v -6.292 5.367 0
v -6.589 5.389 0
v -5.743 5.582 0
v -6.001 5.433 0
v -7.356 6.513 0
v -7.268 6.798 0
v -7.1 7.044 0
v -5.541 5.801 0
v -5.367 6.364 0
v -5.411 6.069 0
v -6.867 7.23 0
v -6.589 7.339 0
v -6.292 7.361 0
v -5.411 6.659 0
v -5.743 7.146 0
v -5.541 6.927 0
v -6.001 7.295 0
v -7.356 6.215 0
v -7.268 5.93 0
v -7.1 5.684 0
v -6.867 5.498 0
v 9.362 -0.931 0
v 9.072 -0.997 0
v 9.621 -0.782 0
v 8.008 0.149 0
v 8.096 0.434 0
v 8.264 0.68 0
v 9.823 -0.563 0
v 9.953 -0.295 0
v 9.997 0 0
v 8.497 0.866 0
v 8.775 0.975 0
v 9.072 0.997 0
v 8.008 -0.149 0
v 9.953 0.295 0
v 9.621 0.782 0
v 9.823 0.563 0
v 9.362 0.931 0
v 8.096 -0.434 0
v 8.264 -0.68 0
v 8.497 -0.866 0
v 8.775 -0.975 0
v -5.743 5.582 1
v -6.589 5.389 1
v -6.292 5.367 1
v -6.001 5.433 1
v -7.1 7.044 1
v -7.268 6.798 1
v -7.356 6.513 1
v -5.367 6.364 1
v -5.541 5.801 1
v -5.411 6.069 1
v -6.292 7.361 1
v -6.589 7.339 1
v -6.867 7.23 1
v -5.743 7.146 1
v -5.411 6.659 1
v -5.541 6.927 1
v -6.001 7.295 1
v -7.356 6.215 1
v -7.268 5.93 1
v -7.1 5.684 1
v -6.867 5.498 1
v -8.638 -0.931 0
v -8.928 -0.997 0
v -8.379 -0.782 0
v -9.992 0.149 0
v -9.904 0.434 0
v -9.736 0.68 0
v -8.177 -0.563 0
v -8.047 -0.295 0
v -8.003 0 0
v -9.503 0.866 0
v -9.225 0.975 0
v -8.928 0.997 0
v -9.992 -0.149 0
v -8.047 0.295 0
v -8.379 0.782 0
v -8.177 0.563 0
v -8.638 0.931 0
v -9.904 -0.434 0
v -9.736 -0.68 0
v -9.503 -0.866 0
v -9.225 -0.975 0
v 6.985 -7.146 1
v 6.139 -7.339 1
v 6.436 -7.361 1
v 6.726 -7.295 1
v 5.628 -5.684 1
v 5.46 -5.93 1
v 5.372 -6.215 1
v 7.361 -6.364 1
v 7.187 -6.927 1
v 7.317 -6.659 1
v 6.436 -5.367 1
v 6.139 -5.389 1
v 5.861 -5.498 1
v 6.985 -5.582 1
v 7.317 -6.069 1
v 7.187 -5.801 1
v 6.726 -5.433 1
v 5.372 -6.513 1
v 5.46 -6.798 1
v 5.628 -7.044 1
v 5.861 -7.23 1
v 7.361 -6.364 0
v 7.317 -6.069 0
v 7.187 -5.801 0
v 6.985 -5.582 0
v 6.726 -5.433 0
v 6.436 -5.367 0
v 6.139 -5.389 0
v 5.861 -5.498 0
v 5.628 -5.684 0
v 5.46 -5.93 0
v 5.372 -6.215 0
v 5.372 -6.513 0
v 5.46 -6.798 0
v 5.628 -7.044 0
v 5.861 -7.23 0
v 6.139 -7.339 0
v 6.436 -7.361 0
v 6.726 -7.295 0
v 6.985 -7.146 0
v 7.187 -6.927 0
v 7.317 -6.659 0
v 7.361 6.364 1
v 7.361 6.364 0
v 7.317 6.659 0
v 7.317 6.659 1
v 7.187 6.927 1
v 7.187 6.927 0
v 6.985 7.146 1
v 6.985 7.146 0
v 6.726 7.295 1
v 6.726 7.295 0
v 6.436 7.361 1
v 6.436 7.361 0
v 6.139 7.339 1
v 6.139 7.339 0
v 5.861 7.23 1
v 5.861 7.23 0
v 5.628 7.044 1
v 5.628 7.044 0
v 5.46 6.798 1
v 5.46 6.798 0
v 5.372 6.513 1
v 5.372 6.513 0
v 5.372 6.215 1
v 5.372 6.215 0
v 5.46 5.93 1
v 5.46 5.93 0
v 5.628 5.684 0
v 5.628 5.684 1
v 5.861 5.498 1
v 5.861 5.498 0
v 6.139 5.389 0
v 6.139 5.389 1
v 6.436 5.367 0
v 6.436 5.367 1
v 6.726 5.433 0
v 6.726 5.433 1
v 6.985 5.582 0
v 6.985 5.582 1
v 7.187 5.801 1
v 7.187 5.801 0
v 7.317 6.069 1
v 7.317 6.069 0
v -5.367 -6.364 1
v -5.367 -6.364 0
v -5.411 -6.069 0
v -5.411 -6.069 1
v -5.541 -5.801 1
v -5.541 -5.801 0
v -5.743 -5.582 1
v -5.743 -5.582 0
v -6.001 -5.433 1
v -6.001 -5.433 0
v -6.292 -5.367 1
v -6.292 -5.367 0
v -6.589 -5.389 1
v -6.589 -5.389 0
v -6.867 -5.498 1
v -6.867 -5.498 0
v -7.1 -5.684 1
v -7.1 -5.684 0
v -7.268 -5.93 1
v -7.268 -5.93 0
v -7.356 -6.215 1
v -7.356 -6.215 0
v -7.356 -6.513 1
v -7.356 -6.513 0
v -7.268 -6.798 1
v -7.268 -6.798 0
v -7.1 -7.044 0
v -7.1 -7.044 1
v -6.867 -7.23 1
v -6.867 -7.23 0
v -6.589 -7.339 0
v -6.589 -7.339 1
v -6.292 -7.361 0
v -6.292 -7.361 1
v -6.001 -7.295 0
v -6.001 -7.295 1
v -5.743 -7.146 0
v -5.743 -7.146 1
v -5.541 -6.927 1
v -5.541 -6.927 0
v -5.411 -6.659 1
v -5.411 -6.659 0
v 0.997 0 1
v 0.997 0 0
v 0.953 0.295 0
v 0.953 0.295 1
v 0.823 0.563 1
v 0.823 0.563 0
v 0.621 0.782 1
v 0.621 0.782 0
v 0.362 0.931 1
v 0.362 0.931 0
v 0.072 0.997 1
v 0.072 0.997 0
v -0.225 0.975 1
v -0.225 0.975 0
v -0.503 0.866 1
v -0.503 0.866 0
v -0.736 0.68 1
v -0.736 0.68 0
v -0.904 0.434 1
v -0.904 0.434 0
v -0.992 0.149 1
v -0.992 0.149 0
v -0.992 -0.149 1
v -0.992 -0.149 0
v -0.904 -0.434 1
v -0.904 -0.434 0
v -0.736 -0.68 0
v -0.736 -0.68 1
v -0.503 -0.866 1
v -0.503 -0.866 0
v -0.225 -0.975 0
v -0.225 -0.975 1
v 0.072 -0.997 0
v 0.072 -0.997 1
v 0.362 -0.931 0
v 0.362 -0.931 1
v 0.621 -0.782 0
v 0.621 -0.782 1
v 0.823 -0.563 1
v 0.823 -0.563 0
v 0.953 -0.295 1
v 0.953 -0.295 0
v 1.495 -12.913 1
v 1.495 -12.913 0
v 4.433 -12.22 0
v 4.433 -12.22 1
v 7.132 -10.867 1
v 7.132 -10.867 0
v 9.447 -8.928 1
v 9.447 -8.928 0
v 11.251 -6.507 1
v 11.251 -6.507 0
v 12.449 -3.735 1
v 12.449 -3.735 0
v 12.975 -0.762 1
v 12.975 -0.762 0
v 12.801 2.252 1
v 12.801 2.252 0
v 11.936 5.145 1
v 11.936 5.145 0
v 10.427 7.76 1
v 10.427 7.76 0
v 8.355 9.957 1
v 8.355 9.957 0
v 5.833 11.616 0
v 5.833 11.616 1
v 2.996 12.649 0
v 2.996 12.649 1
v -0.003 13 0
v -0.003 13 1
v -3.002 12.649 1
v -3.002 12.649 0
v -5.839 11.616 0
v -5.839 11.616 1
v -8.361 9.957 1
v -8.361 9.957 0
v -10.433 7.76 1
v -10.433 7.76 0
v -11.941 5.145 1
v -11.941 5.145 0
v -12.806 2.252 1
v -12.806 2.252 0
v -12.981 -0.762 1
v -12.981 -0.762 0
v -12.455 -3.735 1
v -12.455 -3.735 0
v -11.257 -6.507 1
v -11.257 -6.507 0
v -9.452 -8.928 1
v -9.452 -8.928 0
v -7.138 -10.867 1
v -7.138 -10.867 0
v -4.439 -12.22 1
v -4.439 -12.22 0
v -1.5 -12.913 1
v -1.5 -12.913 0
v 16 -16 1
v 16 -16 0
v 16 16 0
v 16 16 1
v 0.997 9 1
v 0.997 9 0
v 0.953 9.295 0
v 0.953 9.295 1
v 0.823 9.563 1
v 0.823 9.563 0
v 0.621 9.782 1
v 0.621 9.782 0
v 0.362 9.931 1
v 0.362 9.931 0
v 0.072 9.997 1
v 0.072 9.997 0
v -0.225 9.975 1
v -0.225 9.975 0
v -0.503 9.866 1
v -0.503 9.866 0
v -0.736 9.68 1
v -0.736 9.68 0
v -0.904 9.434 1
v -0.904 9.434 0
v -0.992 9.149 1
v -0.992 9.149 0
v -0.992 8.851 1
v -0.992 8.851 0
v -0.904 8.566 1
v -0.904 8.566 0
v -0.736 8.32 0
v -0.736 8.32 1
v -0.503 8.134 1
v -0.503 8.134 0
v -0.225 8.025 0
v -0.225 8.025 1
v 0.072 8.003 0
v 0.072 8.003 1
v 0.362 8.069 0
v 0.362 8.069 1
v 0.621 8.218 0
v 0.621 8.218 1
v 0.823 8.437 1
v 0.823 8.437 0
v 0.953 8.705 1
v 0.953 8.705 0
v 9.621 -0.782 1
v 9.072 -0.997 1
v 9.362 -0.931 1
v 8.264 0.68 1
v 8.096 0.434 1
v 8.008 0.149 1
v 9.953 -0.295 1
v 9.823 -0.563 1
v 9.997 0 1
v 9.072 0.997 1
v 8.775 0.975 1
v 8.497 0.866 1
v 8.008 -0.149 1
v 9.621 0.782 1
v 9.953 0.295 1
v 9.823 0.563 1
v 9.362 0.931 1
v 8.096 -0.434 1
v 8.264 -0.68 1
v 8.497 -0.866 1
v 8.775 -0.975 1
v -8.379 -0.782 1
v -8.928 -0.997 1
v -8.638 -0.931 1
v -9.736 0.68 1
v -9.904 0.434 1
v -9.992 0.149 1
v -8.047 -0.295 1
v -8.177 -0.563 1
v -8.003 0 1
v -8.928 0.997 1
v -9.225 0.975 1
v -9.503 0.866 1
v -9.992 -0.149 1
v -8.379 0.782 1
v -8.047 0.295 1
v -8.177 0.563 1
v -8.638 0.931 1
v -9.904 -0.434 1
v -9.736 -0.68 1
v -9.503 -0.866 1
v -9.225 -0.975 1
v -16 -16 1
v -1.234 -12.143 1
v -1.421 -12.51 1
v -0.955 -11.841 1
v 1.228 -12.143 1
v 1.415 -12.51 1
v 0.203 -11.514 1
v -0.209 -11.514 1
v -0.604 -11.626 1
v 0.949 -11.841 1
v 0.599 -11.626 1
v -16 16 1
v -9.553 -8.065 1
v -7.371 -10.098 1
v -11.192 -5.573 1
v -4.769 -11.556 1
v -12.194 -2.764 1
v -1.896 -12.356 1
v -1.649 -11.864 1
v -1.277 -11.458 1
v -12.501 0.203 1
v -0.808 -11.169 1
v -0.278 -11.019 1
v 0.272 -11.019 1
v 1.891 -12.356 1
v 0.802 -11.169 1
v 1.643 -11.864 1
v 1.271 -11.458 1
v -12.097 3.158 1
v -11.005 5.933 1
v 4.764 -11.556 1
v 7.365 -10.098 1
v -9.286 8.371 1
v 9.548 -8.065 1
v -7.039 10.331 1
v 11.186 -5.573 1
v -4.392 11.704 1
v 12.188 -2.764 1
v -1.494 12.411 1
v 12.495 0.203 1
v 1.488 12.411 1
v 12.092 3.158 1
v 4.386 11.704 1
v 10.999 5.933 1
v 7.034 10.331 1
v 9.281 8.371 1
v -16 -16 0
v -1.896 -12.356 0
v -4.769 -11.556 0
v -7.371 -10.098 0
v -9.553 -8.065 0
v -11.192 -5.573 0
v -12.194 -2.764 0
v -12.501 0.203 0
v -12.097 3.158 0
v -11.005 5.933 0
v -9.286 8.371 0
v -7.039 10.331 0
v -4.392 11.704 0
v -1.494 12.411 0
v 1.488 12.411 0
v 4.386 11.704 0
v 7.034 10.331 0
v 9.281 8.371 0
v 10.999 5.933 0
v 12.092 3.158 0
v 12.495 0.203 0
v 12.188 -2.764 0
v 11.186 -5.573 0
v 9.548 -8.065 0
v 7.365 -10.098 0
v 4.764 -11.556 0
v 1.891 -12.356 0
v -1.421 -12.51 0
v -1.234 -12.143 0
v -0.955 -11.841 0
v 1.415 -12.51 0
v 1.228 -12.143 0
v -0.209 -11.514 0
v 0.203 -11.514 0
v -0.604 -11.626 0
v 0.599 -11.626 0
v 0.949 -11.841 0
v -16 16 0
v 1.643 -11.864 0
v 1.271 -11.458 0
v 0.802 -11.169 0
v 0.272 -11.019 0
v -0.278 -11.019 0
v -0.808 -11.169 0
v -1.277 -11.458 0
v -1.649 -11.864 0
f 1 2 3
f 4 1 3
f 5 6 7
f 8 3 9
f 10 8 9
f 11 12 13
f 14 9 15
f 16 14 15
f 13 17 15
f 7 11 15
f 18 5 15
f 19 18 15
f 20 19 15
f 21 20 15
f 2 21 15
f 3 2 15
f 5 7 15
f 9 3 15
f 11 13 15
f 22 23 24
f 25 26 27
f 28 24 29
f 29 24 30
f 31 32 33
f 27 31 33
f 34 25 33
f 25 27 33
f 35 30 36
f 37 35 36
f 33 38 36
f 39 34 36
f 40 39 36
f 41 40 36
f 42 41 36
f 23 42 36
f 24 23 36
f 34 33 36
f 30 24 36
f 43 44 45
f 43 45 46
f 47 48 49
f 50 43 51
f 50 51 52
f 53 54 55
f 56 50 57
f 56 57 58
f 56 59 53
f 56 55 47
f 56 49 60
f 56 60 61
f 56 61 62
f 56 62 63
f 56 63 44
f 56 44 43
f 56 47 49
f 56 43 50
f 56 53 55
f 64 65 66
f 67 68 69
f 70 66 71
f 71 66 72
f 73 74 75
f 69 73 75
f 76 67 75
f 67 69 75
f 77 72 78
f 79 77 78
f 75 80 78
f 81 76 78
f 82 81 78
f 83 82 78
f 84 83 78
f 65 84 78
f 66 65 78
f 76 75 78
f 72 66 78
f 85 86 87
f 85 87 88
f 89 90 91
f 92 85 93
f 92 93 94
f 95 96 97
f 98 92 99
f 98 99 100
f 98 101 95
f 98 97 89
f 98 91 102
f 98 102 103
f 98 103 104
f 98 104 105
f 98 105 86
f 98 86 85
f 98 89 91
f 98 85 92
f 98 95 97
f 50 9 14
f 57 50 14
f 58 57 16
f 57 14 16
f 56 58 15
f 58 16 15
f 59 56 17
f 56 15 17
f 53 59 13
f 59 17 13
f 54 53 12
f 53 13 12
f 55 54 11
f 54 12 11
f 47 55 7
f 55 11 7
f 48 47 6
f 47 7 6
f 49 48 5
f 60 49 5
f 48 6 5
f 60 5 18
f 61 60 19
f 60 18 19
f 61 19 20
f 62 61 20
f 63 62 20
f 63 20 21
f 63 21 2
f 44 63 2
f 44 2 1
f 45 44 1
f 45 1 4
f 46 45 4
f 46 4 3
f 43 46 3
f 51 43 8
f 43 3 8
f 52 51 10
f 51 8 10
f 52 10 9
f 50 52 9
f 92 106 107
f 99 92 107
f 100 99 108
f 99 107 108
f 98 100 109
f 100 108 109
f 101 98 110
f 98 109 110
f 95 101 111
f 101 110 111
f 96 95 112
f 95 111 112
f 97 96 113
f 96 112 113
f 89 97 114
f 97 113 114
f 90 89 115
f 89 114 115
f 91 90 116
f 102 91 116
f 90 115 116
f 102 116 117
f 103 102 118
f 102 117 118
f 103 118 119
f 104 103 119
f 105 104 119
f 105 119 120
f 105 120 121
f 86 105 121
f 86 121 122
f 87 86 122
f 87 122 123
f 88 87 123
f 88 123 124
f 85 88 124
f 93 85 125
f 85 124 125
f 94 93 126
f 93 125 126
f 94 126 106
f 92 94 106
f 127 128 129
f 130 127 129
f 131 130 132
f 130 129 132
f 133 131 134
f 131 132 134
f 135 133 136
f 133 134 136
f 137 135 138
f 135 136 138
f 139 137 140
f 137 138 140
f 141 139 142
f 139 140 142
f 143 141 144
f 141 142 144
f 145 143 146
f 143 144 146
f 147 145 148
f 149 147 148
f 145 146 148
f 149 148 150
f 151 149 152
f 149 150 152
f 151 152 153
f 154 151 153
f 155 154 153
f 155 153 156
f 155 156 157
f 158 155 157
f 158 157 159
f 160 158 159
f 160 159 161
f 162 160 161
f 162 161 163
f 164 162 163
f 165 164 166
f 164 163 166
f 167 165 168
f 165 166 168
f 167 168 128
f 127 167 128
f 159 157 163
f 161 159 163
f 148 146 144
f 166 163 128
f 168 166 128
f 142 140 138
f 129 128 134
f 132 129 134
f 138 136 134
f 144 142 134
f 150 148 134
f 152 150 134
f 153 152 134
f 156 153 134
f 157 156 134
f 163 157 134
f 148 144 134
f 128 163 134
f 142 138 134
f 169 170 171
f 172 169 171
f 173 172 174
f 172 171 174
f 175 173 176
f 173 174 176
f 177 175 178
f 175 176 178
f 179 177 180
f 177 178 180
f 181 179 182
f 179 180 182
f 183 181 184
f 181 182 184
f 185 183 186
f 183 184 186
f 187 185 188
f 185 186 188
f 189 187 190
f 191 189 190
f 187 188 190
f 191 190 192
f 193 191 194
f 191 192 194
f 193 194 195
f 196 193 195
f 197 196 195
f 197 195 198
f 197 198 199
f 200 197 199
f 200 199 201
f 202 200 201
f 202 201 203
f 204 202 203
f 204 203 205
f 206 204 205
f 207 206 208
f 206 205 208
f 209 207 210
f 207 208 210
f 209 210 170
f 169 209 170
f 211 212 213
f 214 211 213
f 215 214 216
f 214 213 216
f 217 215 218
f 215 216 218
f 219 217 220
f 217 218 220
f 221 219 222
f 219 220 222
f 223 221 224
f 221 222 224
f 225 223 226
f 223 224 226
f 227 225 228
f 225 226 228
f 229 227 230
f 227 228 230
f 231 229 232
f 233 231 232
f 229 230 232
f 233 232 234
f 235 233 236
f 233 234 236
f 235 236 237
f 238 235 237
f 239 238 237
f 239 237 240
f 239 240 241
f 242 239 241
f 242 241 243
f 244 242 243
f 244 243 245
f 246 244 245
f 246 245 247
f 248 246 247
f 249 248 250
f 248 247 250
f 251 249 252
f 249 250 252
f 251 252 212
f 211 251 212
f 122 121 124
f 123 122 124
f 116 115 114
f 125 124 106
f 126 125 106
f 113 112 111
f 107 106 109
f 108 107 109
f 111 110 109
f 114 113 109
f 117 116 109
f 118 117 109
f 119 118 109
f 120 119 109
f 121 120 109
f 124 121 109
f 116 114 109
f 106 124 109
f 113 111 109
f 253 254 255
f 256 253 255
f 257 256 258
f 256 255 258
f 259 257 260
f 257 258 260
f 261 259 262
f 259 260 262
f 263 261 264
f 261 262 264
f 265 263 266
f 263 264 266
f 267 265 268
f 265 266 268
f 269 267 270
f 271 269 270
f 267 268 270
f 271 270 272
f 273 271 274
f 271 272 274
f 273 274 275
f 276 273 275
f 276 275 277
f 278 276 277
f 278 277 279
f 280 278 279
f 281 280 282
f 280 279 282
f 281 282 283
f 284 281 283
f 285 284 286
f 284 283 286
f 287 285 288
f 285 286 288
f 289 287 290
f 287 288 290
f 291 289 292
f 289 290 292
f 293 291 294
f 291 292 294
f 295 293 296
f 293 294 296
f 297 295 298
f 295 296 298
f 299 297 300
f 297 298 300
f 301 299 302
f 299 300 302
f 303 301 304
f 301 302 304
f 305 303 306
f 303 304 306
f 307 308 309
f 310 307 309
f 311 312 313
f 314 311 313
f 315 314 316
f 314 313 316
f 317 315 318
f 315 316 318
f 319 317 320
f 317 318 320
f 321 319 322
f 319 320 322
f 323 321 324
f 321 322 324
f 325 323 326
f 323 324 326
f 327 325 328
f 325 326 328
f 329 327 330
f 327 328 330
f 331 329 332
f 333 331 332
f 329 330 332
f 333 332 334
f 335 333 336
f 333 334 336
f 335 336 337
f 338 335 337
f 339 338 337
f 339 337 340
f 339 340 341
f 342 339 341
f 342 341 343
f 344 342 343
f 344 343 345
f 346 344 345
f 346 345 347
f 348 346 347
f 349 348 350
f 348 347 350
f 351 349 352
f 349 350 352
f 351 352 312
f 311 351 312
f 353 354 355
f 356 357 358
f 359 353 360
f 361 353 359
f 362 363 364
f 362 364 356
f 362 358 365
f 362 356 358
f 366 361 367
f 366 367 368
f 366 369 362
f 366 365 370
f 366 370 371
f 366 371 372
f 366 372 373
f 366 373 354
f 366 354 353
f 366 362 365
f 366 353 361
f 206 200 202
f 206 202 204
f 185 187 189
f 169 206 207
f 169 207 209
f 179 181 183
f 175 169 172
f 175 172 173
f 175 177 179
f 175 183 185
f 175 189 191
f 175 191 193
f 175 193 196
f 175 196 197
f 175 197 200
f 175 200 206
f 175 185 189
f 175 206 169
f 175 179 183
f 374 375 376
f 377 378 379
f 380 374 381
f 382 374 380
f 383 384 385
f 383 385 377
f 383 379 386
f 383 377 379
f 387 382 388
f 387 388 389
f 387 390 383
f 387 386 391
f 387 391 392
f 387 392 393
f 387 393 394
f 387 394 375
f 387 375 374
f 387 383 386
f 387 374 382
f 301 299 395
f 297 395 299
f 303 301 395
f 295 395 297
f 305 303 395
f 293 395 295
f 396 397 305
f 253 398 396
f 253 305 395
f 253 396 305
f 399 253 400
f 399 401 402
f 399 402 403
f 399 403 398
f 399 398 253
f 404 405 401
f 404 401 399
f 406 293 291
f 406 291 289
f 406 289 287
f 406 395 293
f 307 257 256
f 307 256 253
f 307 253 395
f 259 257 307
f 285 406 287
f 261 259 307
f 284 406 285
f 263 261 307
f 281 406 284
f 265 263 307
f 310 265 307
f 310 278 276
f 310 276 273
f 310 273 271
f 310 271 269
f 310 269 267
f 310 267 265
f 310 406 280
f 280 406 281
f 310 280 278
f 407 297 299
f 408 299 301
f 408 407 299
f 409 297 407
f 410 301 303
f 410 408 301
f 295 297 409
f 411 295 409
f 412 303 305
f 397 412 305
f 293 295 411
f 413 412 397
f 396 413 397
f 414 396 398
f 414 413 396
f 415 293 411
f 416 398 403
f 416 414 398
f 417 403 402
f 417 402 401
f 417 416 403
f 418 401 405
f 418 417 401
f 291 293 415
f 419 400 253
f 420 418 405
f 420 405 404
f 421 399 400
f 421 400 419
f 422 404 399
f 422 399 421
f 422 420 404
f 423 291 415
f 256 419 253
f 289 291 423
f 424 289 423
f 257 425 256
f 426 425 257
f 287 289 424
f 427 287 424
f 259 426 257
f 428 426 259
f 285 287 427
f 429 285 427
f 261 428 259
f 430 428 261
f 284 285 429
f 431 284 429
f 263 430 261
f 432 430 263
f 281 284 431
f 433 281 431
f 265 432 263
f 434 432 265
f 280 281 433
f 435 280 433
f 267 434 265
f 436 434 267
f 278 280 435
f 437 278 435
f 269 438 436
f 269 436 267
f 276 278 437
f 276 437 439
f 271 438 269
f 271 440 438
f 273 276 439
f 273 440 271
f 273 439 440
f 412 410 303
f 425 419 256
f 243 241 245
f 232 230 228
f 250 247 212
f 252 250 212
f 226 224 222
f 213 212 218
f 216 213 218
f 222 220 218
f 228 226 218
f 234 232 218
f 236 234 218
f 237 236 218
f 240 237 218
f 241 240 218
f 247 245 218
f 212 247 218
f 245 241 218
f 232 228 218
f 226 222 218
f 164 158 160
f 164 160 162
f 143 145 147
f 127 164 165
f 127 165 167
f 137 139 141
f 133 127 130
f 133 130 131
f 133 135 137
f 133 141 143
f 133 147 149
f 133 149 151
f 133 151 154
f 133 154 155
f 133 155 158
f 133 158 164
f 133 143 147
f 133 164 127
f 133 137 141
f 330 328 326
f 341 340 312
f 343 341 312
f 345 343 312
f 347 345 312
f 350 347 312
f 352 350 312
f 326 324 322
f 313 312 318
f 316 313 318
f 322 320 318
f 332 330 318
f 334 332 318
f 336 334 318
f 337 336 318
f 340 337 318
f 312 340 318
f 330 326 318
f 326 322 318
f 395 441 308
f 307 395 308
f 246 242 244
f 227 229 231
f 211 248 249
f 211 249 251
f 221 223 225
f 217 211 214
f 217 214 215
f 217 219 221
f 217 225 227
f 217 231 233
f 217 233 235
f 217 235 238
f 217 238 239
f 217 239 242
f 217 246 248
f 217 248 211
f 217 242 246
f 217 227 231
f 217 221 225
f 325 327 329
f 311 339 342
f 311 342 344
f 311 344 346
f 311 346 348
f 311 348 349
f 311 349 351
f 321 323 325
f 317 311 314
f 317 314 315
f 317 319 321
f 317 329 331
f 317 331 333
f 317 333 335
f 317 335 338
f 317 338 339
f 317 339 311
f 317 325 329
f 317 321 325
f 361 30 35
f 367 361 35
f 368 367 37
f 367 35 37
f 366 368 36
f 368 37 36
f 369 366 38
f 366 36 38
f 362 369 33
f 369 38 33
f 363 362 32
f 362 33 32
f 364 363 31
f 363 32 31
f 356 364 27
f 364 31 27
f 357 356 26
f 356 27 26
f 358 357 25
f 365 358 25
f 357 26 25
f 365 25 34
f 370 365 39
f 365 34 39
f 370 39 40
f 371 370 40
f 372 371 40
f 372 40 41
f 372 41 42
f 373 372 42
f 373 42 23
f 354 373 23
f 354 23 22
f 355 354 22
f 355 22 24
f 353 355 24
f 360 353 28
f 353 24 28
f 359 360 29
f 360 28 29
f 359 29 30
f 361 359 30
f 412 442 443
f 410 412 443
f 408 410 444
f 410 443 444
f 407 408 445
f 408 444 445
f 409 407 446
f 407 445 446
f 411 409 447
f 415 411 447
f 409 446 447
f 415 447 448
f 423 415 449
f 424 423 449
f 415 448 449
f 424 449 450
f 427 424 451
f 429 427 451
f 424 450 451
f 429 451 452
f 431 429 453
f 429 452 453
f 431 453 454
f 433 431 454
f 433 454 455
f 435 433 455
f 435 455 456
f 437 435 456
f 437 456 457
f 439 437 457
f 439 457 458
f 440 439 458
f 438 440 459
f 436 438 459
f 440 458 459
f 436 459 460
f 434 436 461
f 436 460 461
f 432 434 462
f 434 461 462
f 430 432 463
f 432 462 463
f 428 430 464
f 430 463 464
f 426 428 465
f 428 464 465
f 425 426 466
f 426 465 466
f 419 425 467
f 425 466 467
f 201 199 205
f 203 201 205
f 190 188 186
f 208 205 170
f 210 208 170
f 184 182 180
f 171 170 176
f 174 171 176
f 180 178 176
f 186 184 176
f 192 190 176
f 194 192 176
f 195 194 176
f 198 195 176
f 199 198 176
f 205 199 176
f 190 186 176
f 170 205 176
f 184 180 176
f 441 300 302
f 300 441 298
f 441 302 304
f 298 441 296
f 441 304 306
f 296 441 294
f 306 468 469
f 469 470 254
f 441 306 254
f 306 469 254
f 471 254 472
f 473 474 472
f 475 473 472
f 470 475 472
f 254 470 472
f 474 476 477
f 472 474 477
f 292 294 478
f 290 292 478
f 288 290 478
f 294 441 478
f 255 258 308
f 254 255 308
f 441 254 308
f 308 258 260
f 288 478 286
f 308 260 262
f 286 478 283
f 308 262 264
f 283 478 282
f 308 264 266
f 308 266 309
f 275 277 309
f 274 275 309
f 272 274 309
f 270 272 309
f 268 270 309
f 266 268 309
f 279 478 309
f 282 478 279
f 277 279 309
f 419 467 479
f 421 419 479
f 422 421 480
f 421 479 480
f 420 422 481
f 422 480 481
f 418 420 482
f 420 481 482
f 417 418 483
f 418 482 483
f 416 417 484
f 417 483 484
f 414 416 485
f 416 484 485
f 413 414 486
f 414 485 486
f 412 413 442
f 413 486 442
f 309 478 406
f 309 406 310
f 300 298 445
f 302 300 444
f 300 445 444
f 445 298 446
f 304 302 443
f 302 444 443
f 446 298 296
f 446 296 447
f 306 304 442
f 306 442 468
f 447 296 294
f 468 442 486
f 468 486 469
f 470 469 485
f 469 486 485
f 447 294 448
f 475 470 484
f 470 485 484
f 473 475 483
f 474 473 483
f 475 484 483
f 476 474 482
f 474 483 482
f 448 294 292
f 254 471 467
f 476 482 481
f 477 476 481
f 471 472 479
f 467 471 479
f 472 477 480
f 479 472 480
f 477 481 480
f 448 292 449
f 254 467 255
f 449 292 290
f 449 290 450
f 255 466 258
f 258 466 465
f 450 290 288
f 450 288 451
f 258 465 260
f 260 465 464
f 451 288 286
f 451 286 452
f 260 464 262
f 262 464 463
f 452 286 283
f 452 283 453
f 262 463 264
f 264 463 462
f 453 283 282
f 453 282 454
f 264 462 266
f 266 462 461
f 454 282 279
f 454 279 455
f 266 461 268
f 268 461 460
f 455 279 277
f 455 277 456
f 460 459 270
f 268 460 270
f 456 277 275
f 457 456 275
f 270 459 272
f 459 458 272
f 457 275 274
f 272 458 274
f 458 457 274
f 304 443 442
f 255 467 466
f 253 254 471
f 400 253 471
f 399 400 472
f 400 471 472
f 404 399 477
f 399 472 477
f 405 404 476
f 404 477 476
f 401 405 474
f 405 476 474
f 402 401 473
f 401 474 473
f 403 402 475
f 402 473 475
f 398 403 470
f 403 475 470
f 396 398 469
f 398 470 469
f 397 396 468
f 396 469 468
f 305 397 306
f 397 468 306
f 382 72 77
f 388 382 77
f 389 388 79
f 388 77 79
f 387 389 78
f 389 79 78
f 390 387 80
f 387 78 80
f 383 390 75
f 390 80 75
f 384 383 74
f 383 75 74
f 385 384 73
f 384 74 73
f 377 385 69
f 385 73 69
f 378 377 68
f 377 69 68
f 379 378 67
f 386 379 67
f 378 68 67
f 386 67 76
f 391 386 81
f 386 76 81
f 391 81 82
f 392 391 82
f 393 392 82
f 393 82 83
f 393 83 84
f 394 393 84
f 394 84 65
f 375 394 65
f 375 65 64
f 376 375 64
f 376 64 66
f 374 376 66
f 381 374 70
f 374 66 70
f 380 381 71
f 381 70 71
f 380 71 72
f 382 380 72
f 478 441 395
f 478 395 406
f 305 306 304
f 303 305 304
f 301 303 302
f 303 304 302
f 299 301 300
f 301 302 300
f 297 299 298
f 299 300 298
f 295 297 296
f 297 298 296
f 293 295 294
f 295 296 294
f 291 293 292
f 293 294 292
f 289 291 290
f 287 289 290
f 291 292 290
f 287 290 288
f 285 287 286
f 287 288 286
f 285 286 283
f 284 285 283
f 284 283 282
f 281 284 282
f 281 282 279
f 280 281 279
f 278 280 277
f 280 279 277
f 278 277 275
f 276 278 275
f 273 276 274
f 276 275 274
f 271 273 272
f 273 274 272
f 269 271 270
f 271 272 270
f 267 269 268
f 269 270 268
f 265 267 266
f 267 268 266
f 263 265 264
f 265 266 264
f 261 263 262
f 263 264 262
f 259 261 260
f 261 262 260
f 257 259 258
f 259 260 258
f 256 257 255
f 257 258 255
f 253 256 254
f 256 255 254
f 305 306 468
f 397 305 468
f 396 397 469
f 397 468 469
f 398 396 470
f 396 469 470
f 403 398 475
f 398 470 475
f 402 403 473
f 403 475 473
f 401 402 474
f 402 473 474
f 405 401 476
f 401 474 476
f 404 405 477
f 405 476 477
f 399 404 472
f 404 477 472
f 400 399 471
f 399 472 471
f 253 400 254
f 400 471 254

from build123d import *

# Parameters (mm, degrees)
F1_DEPTH = 1
F0_R     = 1
F0_W     = 32
F0_H     = 32
F2_DEPTH = 1


# Not quite as in the source:
# - a feature names something its author has since deleted; it is built from what else it names


with BuildPart() as f1:
    # F0 (on Top) → F1 (new body)
    with BuildSketch(Plane.XY):
        with BuildLine():
            ThreePointArc((-1.5003664489, -12.9134615385), (-0.0028648313, -11.5), (1.4946367862, -12.9134615385))
            ThreePointArc((1.4946367862, -12.9134615385), (-0.0028648313, 13), (-1.5003664489, -12.9134615385))
        make_face()
        with BuildLine():
            ThreePointArc((-1.8962656648, -12.3557692308), (-0.0028648313, 12.5), (1.8905360021, -12.3557692308))
            ThreePointArc((1.8905360021, -12.3557692308), (-0.0028648313, -11), (-1.8962656648, -12.3557692308))
        make_face(mode=Mode.SUBTRACT)
    extrude(amount=F1_DEPTH)


with BuildPart() as f1b:
    # F0 (on Top) → F1, piece 2 (new body)
    with BuildSketch(Plane.XY):
        with Locations((-6.366825862, -6.3639610307)):
            Circle(F0_R)
    extrude(amount=F1_DEPTH)


with BuildPart() as f1c:
    # F0 (on Top) → F1, piece 3 (new body)
    with BuildSketch(Plane.XY):
        with Locations((-9.0028648313, 0)):
            Circle(F0_R)
    extrude(amount=F1_DEPTH)


with BuildPart() as f1d:
    # F0 (on Top) → F1, piece 4 (new body)
    with BuildSketch(Plane.XY):
        with Locations((-6.366825862, 6.3639610307)):
            Circle(F0_R)
    extrude(amount=F1_DEPTH)


with BuildPart() as f1e:
    # F0 (on Top) → F1, piece 5 (new body)
    with BuildSketch(Plane.XY):
        with Locations((-0.0028648313, 9)):
            Circle(F0_R)
    extrude(amount=F1_DEPTH)


with BuildPart() as f1f:
    # F0 (on Top) → F1, piece 6 (new body)
    with BuildSketch(Plane.XY):
        with Locations((6.3610961993, 6.3639610307)):
            Circle(F0_R)
    extrude(amount=F1_DEPTH)


with BuildPart() as f1g:
    # F0 (on Top) → F1, piece 7 (new body)
    with BuildSketch(Plane.XY):
        with Locations((8.9971351687, 0)):
            Circle(F0_R)
    extrude(amount=F1_DEPTH)


with BuildPart() as f1h:
    # F0 (on Top) → F1, piece 8 (new body)
    with BuildSketch(Plane.XY):
        with Locations((6.3610961993, -6.3639610307)):
            Circle(F0_R)
    extrude(amount=F1_DEPTH)


with BuildPart() as f1i:
    # F0 (on Top) → F1, piece 9 (new body)
    with BuildSketch(Plane.XY):
        with Locations((-0.0028648313, 0)):
            Circle(F0_R)
    extrude(amount=F1_DEPTH)


with BuildPart() as f2:
    # F0 (on Top) → F2 (new body)
    with BuildSketch(Plane.XY):
        Rectangle(F0_W, F0_H)
        with BuildLine():
            ThreePointArc((-1.5003664489, -12.9134615385), (-0.0028648313, 13), (1.4946367862, -12.9134615385))
            ThreePointArc((1.4946367862, -12.9134615385), (-0.0028648313, -11.5), (-1.5003664489, -12.9134615385))
        make_face(mode=Mode.SUBTRACT)
    extrude(amount=F2_DEPTH)


solid = Compound([f1.part, f1b.part, f1c.part, f1d.part, f1e.part, f1f.part, f1g.part, f1h.part, f1i.part, f2.part])
